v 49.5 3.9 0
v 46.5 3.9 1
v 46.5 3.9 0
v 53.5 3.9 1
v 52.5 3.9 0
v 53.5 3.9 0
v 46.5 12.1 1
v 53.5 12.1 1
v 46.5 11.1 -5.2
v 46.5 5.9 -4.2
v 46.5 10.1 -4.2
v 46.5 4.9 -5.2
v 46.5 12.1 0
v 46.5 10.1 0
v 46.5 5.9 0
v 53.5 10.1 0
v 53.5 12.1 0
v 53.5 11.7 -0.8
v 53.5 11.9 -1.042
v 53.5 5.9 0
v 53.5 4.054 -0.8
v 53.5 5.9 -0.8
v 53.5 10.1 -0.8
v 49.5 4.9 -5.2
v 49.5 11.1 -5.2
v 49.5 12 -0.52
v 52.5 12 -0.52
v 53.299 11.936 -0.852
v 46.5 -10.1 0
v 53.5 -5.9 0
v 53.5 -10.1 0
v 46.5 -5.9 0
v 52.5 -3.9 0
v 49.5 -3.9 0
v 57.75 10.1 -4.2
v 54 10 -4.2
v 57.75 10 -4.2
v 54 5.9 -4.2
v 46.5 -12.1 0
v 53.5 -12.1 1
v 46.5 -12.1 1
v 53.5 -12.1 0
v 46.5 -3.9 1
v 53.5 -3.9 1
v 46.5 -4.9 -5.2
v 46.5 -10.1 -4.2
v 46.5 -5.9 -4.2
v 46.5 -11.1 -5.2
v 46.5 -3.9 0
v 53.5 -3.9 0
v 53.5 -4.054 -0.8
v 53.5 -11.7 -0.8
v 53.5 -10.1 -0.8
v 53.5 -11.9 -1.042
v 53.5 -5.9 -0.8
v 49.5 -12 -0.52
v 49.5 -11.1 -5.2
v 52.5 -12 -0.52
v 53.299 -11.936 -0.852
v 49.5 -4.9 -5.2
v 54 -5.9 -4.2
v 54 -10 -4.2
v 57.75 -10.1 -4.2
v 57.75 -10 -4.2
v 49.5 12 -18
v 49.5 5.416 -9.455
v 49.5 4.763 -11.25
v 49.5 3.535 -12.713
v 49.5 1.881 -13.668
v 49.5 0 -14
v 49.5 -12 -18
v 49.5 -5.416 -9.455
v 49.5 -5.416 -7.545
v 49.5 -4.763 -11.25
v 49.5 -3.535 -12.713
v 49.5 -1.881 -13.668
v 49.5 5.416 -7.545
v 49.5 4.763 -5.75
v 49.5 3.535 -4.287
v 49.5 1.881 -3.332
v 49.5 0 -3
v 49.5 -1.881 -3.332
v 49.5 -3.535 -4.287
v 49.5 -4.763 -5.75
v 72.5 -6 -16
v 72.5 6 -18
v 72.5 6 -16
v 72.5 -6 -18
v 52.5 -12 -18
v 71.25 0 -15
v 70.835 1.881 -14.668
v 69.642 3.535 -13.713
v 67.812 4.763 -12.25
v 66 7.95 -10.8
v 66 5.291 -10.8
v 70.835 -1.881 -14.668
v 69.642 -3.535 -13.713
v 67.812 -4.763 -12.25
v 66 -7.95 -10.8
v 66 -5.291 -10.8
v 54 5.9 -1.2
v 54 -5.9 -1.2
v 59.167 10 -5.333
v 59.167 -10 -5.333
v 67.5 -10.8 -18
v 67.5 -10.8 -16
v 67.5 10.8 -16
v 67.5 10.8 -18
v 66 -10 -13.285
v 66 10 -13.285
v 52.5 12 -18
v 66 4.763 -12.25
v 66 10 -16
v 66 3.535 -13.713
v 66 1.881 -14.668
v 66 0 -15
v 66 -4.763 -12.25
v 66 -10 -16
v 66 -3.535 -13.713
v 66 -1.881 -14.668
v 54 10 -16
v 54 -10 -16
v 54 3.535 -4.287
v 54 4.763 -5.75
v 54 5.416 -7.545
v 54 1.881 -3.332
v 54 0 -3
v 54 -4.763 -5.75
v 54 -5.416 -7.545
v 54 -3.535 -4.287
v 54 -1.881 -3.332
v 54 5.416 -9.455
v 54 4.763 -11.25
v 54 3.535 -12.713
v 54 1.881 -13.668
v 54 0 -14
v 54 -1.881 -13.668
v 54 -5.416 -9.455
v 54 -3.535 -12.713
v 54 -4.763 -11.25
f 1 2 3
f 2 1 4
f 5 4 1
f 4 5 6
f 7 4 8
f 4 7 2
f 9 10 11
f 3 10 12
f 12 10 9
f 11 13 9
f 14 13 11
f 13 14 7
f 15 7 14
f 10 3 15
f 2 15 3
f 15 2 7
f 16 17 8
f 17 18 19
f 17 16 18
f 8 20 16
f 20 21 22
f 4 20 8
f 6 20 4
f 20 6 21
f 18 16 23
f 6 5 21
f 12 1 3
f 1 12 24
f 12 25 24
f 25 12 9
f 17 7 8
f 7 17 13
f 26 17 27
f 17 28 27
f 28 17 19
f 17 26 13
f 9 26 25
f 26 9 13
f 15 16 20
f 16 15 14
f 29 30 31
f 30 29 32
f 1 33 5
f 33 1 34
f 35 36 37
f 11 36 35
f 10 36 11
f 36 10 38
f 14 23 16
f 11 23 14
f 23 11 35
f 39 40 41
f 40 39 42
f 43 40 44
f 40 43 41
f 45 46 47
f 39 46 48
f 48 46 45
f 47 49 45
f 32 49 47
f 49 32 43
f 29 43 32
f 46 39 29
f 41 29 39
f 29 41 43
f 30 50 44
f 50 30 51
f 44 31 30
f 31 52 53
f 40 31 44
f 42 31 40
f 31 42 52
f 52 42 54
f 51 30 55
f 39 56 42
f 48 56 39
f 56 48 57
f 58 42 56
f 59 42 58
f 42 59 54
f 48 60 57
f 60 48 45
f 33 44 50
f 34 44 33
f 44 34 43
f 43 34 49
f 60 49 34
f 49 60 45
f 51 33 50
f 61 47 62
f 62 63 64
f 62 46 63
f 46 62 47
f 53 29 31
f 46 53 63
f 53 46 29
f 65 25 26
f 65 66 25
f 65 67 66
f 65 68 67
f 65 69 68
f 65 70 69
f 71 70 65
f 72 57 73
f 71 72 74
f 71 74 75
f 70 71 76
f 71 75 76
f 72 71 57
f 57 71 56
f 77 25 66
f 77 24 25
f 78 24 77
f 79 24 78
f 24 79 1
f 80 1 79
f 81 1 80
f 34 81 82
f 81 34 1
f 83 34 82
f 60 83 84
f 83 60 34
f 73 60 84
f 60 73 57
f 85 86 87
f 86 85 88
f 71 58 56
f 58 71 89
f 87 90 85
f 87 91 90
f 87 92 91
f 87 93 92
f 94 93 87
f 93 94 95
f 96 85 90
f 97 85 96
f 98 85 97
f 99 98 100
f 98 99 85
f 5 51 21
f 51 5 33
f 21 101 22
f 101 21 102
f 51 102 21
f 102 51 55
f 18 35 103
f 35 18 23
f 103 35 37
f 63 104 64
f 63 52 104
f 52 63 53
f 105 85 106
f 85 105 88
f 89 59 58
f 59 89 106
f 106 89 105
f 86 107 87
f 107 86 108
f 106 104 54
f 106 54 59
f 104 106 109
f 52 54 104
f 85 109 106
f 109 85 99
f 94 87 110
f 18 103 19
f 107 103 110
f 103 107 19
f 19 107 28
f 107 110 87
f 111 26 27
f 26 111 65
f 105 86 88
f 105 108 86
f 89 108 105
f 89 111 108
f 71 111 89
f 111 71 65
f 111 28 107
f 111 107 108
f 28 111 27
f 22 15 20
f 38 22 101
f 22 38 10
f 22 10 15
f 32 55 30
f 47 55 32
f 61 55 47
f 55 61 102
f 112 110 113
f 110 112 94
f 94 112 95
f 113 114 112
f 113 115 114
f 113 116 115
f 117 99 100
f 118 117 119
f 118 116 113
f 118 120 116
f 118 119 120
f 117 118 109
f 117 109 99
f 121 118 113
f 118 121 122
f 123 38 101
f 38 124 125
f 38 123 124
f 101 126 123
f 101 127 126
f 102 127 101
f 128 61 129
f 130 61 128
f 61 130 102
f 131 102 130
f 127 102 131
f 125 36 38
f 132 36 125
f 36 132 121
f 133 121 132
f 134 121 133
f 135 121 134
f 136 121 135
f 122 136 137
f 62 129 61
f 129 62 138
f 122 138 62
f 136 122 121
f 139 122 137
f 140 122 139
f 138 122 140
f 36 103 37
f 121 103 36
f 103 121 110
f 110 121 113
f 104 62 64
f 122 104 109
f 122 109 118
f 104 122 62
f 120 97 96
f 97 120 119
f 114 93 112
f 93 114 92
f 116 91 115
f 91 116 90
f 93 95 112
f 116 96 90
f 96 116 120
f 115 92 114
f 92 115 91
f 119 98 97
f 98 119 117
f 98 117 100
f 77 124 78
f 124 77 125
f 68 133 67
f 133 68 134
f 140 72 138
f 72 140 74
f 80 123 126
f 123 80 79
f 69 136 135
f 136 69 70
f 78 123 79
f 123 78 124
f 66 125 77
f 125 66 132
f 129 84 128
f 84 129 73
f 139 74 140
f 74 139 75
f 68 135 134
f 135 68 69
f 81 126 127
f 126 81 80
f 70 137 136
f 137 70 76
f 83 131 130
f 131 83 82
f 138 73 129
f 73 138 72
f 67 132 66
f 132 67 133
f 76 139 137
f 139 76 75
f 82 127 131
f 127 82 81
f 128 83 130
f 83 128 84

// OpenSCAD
r = 4.2;
rlx = 80;
rdy = 16;

flx = 18;
fly = 20;

aly = 85;
alx = 6;


cly = 24;
clx = 25;

createArm1 = true;
createArm2 = true;
createFc = true;
createCH=true;

createArm1 = false;
createArm2 = false;
createFc = false;
//createCH=false;
createRails=false;

// Rails
module rails() {
  color("green")
  union(){
    translate([-rlx/2,-r/2+rdy/2,-r])
    cube([rlx,r,r]);
    translate([-rlx/2,-r/2-rdy/2,-r])
    cube([rlx,r,r]);
  };
};

// Flightcontroller
module fcp() {
  color("red")
  difference(){
    union(){
      _bracket(blx=flx);
      translate([-flx/2,-fly/2,0])cube([flx,fly,1]);
      translate([+6.5,+6.5,1])cylinder(r=2,h=2,$fn=20);
      translate([+6.5,-6.5,1])cylinder(r=2,h=2,$fn=20);
      translate([-6.5,+6.5,1])cylinder(r=2,h=2,$fn=20);
      translate([-6.5,-6.5,1])cylinder(r=2,h=2,$fn=20);
    }
    translate([+6.5,+6.5,-1])cylinder(r=0.75,h=20,$fn=20);
    translate([+6.5,-6.5,-1])cylinder(r=0.75,h=20,$fn=20);
    translate([-6.5,+6.5,-1])cylinder(r=0.75,h=20,$fn=20);
    translate([-6.5,-6.5,-1])cylinder(r=0.75,h=20,$fn=20);
  }

}

// Arm
module arms(px=10) {
  color("blue")translate([px,0,0])
  difference(){
      union(){
        translate([-alx/2,-aly/2,0])cube([alx,aly,1]);
        
          
        hull(){
          translate([-alx/2,-aly/2+6,-1])cube([1,1,1]);
          translate([-alx/2,+aly/2-6,-1])cube([1,1,1]);
          translate([-alx/2,-0.5,-4])cube([1,1,4]);
        }
        
        hull(){
          translate([+alx/2-1,-aly/2+6,-1])cube([1,1,1]);
          translate([+alx/2-1,+aly/2-6,-1])cube([1,1,1]);
          translate([+alx/2-1,-0.5,-4])cube([1,1,4]);
        }
        
        translate([0,-aly/2,-1])_platform();
        translate([0,+aly/2,-1])_platform();
        _bracket(blx=alx);
      }
      rails();
      
      translate([0,+aly/2,-10])cylinder(r=1.5,h=20, $fn=30);
      translate([0,-aly/2,-10])cylinder(r=1.5,h=20, $fn=30);
  }
      
}

// CameraHolder
module camera(px=0) {
  color("yellow")translate([px,0,0])

  union(){
    translate([-6,-20/2,0])cube([12,20,15]);
    translate([-6,0,6.5])rotate([0,90,0])cylinder(r=5.5,h=25);

  }
      
}

module cameraHolder(px=0) {
  color("purple")translate([px,0,0])
    
  difference(){
    union(){
      hull(){
        translate([-clx/2+2,-cly/2,-18])cube([3,cly,18]);
        translate([-clx/2+2+20,-0.5*cly/2,-18])cube([3,0.5*cly,2]);
          
        translate([-clx/2+2+15,-0.9*cly/2,-18])cube([3,0.9*cly,2]);  
          
      }
      translate([-clx/2+2.5,0,0])_bracket(blx=7);
      
    }
    
    rails();
    translate([0,0,-16])camera();
    translate([-16,0,-8.5])rotate([0,90,0])cylinder(r=5.5,h=25);
  }
   
}

// bracket
module _bracket(blx=10){
  translate([0,rdy/2,0])
  difference(){
    hull(){
      translate([-blx/2,-(r+2)/2,-r-1])cube([blx,r+2,1]);
      translate([-blx/2,-(r+4)/2,0])cube([blx,r+4,1]);
    }
    translate([-rlx/2,-r/2,-r])
    cube([rlx,r,r]);  }
    
  translate([0,-rdy/2,0])
  difference(){
    hull(){
      translate([-blx/2,-(r+2)/2,-r-1])cube([blx,r+2,1]);
      translate([-blx/2,-(r+4)/2,0])cube([blx,r+4,1]);
    }
    translate([-rlx/2,-r/2,-r])
    cube([rlx,r,r]);  }
    
}


// Plattform
module _platform(mirror=true){
  difference(){
    translate([0,0,0])cylinder(r=7,h=2,$fn=6);
    translate([0,0,-1])cylinder(r=1.5,h=5,$fn=10);
    translate([4.5,0,-1])cylinder(r=0.6,h=5,$fn=10);
    translate([0,4.5,-1])cylinder(r=0.6,h=5,$fn=10);
    translate([-4.5,0,-1])cylinder(r=0.6,h=5,$fn=10);
    translate([0,-4.5,-1])cylinder(r=0.6,h=5,$fn=10);
  }
}






if (createRails){rails();}
if (createArm1){arms(px=20);}
if (createArm2){arms(px=-26);}
if (createFc){fcp();}
if (createCH){cameraHolder(px=60);}
